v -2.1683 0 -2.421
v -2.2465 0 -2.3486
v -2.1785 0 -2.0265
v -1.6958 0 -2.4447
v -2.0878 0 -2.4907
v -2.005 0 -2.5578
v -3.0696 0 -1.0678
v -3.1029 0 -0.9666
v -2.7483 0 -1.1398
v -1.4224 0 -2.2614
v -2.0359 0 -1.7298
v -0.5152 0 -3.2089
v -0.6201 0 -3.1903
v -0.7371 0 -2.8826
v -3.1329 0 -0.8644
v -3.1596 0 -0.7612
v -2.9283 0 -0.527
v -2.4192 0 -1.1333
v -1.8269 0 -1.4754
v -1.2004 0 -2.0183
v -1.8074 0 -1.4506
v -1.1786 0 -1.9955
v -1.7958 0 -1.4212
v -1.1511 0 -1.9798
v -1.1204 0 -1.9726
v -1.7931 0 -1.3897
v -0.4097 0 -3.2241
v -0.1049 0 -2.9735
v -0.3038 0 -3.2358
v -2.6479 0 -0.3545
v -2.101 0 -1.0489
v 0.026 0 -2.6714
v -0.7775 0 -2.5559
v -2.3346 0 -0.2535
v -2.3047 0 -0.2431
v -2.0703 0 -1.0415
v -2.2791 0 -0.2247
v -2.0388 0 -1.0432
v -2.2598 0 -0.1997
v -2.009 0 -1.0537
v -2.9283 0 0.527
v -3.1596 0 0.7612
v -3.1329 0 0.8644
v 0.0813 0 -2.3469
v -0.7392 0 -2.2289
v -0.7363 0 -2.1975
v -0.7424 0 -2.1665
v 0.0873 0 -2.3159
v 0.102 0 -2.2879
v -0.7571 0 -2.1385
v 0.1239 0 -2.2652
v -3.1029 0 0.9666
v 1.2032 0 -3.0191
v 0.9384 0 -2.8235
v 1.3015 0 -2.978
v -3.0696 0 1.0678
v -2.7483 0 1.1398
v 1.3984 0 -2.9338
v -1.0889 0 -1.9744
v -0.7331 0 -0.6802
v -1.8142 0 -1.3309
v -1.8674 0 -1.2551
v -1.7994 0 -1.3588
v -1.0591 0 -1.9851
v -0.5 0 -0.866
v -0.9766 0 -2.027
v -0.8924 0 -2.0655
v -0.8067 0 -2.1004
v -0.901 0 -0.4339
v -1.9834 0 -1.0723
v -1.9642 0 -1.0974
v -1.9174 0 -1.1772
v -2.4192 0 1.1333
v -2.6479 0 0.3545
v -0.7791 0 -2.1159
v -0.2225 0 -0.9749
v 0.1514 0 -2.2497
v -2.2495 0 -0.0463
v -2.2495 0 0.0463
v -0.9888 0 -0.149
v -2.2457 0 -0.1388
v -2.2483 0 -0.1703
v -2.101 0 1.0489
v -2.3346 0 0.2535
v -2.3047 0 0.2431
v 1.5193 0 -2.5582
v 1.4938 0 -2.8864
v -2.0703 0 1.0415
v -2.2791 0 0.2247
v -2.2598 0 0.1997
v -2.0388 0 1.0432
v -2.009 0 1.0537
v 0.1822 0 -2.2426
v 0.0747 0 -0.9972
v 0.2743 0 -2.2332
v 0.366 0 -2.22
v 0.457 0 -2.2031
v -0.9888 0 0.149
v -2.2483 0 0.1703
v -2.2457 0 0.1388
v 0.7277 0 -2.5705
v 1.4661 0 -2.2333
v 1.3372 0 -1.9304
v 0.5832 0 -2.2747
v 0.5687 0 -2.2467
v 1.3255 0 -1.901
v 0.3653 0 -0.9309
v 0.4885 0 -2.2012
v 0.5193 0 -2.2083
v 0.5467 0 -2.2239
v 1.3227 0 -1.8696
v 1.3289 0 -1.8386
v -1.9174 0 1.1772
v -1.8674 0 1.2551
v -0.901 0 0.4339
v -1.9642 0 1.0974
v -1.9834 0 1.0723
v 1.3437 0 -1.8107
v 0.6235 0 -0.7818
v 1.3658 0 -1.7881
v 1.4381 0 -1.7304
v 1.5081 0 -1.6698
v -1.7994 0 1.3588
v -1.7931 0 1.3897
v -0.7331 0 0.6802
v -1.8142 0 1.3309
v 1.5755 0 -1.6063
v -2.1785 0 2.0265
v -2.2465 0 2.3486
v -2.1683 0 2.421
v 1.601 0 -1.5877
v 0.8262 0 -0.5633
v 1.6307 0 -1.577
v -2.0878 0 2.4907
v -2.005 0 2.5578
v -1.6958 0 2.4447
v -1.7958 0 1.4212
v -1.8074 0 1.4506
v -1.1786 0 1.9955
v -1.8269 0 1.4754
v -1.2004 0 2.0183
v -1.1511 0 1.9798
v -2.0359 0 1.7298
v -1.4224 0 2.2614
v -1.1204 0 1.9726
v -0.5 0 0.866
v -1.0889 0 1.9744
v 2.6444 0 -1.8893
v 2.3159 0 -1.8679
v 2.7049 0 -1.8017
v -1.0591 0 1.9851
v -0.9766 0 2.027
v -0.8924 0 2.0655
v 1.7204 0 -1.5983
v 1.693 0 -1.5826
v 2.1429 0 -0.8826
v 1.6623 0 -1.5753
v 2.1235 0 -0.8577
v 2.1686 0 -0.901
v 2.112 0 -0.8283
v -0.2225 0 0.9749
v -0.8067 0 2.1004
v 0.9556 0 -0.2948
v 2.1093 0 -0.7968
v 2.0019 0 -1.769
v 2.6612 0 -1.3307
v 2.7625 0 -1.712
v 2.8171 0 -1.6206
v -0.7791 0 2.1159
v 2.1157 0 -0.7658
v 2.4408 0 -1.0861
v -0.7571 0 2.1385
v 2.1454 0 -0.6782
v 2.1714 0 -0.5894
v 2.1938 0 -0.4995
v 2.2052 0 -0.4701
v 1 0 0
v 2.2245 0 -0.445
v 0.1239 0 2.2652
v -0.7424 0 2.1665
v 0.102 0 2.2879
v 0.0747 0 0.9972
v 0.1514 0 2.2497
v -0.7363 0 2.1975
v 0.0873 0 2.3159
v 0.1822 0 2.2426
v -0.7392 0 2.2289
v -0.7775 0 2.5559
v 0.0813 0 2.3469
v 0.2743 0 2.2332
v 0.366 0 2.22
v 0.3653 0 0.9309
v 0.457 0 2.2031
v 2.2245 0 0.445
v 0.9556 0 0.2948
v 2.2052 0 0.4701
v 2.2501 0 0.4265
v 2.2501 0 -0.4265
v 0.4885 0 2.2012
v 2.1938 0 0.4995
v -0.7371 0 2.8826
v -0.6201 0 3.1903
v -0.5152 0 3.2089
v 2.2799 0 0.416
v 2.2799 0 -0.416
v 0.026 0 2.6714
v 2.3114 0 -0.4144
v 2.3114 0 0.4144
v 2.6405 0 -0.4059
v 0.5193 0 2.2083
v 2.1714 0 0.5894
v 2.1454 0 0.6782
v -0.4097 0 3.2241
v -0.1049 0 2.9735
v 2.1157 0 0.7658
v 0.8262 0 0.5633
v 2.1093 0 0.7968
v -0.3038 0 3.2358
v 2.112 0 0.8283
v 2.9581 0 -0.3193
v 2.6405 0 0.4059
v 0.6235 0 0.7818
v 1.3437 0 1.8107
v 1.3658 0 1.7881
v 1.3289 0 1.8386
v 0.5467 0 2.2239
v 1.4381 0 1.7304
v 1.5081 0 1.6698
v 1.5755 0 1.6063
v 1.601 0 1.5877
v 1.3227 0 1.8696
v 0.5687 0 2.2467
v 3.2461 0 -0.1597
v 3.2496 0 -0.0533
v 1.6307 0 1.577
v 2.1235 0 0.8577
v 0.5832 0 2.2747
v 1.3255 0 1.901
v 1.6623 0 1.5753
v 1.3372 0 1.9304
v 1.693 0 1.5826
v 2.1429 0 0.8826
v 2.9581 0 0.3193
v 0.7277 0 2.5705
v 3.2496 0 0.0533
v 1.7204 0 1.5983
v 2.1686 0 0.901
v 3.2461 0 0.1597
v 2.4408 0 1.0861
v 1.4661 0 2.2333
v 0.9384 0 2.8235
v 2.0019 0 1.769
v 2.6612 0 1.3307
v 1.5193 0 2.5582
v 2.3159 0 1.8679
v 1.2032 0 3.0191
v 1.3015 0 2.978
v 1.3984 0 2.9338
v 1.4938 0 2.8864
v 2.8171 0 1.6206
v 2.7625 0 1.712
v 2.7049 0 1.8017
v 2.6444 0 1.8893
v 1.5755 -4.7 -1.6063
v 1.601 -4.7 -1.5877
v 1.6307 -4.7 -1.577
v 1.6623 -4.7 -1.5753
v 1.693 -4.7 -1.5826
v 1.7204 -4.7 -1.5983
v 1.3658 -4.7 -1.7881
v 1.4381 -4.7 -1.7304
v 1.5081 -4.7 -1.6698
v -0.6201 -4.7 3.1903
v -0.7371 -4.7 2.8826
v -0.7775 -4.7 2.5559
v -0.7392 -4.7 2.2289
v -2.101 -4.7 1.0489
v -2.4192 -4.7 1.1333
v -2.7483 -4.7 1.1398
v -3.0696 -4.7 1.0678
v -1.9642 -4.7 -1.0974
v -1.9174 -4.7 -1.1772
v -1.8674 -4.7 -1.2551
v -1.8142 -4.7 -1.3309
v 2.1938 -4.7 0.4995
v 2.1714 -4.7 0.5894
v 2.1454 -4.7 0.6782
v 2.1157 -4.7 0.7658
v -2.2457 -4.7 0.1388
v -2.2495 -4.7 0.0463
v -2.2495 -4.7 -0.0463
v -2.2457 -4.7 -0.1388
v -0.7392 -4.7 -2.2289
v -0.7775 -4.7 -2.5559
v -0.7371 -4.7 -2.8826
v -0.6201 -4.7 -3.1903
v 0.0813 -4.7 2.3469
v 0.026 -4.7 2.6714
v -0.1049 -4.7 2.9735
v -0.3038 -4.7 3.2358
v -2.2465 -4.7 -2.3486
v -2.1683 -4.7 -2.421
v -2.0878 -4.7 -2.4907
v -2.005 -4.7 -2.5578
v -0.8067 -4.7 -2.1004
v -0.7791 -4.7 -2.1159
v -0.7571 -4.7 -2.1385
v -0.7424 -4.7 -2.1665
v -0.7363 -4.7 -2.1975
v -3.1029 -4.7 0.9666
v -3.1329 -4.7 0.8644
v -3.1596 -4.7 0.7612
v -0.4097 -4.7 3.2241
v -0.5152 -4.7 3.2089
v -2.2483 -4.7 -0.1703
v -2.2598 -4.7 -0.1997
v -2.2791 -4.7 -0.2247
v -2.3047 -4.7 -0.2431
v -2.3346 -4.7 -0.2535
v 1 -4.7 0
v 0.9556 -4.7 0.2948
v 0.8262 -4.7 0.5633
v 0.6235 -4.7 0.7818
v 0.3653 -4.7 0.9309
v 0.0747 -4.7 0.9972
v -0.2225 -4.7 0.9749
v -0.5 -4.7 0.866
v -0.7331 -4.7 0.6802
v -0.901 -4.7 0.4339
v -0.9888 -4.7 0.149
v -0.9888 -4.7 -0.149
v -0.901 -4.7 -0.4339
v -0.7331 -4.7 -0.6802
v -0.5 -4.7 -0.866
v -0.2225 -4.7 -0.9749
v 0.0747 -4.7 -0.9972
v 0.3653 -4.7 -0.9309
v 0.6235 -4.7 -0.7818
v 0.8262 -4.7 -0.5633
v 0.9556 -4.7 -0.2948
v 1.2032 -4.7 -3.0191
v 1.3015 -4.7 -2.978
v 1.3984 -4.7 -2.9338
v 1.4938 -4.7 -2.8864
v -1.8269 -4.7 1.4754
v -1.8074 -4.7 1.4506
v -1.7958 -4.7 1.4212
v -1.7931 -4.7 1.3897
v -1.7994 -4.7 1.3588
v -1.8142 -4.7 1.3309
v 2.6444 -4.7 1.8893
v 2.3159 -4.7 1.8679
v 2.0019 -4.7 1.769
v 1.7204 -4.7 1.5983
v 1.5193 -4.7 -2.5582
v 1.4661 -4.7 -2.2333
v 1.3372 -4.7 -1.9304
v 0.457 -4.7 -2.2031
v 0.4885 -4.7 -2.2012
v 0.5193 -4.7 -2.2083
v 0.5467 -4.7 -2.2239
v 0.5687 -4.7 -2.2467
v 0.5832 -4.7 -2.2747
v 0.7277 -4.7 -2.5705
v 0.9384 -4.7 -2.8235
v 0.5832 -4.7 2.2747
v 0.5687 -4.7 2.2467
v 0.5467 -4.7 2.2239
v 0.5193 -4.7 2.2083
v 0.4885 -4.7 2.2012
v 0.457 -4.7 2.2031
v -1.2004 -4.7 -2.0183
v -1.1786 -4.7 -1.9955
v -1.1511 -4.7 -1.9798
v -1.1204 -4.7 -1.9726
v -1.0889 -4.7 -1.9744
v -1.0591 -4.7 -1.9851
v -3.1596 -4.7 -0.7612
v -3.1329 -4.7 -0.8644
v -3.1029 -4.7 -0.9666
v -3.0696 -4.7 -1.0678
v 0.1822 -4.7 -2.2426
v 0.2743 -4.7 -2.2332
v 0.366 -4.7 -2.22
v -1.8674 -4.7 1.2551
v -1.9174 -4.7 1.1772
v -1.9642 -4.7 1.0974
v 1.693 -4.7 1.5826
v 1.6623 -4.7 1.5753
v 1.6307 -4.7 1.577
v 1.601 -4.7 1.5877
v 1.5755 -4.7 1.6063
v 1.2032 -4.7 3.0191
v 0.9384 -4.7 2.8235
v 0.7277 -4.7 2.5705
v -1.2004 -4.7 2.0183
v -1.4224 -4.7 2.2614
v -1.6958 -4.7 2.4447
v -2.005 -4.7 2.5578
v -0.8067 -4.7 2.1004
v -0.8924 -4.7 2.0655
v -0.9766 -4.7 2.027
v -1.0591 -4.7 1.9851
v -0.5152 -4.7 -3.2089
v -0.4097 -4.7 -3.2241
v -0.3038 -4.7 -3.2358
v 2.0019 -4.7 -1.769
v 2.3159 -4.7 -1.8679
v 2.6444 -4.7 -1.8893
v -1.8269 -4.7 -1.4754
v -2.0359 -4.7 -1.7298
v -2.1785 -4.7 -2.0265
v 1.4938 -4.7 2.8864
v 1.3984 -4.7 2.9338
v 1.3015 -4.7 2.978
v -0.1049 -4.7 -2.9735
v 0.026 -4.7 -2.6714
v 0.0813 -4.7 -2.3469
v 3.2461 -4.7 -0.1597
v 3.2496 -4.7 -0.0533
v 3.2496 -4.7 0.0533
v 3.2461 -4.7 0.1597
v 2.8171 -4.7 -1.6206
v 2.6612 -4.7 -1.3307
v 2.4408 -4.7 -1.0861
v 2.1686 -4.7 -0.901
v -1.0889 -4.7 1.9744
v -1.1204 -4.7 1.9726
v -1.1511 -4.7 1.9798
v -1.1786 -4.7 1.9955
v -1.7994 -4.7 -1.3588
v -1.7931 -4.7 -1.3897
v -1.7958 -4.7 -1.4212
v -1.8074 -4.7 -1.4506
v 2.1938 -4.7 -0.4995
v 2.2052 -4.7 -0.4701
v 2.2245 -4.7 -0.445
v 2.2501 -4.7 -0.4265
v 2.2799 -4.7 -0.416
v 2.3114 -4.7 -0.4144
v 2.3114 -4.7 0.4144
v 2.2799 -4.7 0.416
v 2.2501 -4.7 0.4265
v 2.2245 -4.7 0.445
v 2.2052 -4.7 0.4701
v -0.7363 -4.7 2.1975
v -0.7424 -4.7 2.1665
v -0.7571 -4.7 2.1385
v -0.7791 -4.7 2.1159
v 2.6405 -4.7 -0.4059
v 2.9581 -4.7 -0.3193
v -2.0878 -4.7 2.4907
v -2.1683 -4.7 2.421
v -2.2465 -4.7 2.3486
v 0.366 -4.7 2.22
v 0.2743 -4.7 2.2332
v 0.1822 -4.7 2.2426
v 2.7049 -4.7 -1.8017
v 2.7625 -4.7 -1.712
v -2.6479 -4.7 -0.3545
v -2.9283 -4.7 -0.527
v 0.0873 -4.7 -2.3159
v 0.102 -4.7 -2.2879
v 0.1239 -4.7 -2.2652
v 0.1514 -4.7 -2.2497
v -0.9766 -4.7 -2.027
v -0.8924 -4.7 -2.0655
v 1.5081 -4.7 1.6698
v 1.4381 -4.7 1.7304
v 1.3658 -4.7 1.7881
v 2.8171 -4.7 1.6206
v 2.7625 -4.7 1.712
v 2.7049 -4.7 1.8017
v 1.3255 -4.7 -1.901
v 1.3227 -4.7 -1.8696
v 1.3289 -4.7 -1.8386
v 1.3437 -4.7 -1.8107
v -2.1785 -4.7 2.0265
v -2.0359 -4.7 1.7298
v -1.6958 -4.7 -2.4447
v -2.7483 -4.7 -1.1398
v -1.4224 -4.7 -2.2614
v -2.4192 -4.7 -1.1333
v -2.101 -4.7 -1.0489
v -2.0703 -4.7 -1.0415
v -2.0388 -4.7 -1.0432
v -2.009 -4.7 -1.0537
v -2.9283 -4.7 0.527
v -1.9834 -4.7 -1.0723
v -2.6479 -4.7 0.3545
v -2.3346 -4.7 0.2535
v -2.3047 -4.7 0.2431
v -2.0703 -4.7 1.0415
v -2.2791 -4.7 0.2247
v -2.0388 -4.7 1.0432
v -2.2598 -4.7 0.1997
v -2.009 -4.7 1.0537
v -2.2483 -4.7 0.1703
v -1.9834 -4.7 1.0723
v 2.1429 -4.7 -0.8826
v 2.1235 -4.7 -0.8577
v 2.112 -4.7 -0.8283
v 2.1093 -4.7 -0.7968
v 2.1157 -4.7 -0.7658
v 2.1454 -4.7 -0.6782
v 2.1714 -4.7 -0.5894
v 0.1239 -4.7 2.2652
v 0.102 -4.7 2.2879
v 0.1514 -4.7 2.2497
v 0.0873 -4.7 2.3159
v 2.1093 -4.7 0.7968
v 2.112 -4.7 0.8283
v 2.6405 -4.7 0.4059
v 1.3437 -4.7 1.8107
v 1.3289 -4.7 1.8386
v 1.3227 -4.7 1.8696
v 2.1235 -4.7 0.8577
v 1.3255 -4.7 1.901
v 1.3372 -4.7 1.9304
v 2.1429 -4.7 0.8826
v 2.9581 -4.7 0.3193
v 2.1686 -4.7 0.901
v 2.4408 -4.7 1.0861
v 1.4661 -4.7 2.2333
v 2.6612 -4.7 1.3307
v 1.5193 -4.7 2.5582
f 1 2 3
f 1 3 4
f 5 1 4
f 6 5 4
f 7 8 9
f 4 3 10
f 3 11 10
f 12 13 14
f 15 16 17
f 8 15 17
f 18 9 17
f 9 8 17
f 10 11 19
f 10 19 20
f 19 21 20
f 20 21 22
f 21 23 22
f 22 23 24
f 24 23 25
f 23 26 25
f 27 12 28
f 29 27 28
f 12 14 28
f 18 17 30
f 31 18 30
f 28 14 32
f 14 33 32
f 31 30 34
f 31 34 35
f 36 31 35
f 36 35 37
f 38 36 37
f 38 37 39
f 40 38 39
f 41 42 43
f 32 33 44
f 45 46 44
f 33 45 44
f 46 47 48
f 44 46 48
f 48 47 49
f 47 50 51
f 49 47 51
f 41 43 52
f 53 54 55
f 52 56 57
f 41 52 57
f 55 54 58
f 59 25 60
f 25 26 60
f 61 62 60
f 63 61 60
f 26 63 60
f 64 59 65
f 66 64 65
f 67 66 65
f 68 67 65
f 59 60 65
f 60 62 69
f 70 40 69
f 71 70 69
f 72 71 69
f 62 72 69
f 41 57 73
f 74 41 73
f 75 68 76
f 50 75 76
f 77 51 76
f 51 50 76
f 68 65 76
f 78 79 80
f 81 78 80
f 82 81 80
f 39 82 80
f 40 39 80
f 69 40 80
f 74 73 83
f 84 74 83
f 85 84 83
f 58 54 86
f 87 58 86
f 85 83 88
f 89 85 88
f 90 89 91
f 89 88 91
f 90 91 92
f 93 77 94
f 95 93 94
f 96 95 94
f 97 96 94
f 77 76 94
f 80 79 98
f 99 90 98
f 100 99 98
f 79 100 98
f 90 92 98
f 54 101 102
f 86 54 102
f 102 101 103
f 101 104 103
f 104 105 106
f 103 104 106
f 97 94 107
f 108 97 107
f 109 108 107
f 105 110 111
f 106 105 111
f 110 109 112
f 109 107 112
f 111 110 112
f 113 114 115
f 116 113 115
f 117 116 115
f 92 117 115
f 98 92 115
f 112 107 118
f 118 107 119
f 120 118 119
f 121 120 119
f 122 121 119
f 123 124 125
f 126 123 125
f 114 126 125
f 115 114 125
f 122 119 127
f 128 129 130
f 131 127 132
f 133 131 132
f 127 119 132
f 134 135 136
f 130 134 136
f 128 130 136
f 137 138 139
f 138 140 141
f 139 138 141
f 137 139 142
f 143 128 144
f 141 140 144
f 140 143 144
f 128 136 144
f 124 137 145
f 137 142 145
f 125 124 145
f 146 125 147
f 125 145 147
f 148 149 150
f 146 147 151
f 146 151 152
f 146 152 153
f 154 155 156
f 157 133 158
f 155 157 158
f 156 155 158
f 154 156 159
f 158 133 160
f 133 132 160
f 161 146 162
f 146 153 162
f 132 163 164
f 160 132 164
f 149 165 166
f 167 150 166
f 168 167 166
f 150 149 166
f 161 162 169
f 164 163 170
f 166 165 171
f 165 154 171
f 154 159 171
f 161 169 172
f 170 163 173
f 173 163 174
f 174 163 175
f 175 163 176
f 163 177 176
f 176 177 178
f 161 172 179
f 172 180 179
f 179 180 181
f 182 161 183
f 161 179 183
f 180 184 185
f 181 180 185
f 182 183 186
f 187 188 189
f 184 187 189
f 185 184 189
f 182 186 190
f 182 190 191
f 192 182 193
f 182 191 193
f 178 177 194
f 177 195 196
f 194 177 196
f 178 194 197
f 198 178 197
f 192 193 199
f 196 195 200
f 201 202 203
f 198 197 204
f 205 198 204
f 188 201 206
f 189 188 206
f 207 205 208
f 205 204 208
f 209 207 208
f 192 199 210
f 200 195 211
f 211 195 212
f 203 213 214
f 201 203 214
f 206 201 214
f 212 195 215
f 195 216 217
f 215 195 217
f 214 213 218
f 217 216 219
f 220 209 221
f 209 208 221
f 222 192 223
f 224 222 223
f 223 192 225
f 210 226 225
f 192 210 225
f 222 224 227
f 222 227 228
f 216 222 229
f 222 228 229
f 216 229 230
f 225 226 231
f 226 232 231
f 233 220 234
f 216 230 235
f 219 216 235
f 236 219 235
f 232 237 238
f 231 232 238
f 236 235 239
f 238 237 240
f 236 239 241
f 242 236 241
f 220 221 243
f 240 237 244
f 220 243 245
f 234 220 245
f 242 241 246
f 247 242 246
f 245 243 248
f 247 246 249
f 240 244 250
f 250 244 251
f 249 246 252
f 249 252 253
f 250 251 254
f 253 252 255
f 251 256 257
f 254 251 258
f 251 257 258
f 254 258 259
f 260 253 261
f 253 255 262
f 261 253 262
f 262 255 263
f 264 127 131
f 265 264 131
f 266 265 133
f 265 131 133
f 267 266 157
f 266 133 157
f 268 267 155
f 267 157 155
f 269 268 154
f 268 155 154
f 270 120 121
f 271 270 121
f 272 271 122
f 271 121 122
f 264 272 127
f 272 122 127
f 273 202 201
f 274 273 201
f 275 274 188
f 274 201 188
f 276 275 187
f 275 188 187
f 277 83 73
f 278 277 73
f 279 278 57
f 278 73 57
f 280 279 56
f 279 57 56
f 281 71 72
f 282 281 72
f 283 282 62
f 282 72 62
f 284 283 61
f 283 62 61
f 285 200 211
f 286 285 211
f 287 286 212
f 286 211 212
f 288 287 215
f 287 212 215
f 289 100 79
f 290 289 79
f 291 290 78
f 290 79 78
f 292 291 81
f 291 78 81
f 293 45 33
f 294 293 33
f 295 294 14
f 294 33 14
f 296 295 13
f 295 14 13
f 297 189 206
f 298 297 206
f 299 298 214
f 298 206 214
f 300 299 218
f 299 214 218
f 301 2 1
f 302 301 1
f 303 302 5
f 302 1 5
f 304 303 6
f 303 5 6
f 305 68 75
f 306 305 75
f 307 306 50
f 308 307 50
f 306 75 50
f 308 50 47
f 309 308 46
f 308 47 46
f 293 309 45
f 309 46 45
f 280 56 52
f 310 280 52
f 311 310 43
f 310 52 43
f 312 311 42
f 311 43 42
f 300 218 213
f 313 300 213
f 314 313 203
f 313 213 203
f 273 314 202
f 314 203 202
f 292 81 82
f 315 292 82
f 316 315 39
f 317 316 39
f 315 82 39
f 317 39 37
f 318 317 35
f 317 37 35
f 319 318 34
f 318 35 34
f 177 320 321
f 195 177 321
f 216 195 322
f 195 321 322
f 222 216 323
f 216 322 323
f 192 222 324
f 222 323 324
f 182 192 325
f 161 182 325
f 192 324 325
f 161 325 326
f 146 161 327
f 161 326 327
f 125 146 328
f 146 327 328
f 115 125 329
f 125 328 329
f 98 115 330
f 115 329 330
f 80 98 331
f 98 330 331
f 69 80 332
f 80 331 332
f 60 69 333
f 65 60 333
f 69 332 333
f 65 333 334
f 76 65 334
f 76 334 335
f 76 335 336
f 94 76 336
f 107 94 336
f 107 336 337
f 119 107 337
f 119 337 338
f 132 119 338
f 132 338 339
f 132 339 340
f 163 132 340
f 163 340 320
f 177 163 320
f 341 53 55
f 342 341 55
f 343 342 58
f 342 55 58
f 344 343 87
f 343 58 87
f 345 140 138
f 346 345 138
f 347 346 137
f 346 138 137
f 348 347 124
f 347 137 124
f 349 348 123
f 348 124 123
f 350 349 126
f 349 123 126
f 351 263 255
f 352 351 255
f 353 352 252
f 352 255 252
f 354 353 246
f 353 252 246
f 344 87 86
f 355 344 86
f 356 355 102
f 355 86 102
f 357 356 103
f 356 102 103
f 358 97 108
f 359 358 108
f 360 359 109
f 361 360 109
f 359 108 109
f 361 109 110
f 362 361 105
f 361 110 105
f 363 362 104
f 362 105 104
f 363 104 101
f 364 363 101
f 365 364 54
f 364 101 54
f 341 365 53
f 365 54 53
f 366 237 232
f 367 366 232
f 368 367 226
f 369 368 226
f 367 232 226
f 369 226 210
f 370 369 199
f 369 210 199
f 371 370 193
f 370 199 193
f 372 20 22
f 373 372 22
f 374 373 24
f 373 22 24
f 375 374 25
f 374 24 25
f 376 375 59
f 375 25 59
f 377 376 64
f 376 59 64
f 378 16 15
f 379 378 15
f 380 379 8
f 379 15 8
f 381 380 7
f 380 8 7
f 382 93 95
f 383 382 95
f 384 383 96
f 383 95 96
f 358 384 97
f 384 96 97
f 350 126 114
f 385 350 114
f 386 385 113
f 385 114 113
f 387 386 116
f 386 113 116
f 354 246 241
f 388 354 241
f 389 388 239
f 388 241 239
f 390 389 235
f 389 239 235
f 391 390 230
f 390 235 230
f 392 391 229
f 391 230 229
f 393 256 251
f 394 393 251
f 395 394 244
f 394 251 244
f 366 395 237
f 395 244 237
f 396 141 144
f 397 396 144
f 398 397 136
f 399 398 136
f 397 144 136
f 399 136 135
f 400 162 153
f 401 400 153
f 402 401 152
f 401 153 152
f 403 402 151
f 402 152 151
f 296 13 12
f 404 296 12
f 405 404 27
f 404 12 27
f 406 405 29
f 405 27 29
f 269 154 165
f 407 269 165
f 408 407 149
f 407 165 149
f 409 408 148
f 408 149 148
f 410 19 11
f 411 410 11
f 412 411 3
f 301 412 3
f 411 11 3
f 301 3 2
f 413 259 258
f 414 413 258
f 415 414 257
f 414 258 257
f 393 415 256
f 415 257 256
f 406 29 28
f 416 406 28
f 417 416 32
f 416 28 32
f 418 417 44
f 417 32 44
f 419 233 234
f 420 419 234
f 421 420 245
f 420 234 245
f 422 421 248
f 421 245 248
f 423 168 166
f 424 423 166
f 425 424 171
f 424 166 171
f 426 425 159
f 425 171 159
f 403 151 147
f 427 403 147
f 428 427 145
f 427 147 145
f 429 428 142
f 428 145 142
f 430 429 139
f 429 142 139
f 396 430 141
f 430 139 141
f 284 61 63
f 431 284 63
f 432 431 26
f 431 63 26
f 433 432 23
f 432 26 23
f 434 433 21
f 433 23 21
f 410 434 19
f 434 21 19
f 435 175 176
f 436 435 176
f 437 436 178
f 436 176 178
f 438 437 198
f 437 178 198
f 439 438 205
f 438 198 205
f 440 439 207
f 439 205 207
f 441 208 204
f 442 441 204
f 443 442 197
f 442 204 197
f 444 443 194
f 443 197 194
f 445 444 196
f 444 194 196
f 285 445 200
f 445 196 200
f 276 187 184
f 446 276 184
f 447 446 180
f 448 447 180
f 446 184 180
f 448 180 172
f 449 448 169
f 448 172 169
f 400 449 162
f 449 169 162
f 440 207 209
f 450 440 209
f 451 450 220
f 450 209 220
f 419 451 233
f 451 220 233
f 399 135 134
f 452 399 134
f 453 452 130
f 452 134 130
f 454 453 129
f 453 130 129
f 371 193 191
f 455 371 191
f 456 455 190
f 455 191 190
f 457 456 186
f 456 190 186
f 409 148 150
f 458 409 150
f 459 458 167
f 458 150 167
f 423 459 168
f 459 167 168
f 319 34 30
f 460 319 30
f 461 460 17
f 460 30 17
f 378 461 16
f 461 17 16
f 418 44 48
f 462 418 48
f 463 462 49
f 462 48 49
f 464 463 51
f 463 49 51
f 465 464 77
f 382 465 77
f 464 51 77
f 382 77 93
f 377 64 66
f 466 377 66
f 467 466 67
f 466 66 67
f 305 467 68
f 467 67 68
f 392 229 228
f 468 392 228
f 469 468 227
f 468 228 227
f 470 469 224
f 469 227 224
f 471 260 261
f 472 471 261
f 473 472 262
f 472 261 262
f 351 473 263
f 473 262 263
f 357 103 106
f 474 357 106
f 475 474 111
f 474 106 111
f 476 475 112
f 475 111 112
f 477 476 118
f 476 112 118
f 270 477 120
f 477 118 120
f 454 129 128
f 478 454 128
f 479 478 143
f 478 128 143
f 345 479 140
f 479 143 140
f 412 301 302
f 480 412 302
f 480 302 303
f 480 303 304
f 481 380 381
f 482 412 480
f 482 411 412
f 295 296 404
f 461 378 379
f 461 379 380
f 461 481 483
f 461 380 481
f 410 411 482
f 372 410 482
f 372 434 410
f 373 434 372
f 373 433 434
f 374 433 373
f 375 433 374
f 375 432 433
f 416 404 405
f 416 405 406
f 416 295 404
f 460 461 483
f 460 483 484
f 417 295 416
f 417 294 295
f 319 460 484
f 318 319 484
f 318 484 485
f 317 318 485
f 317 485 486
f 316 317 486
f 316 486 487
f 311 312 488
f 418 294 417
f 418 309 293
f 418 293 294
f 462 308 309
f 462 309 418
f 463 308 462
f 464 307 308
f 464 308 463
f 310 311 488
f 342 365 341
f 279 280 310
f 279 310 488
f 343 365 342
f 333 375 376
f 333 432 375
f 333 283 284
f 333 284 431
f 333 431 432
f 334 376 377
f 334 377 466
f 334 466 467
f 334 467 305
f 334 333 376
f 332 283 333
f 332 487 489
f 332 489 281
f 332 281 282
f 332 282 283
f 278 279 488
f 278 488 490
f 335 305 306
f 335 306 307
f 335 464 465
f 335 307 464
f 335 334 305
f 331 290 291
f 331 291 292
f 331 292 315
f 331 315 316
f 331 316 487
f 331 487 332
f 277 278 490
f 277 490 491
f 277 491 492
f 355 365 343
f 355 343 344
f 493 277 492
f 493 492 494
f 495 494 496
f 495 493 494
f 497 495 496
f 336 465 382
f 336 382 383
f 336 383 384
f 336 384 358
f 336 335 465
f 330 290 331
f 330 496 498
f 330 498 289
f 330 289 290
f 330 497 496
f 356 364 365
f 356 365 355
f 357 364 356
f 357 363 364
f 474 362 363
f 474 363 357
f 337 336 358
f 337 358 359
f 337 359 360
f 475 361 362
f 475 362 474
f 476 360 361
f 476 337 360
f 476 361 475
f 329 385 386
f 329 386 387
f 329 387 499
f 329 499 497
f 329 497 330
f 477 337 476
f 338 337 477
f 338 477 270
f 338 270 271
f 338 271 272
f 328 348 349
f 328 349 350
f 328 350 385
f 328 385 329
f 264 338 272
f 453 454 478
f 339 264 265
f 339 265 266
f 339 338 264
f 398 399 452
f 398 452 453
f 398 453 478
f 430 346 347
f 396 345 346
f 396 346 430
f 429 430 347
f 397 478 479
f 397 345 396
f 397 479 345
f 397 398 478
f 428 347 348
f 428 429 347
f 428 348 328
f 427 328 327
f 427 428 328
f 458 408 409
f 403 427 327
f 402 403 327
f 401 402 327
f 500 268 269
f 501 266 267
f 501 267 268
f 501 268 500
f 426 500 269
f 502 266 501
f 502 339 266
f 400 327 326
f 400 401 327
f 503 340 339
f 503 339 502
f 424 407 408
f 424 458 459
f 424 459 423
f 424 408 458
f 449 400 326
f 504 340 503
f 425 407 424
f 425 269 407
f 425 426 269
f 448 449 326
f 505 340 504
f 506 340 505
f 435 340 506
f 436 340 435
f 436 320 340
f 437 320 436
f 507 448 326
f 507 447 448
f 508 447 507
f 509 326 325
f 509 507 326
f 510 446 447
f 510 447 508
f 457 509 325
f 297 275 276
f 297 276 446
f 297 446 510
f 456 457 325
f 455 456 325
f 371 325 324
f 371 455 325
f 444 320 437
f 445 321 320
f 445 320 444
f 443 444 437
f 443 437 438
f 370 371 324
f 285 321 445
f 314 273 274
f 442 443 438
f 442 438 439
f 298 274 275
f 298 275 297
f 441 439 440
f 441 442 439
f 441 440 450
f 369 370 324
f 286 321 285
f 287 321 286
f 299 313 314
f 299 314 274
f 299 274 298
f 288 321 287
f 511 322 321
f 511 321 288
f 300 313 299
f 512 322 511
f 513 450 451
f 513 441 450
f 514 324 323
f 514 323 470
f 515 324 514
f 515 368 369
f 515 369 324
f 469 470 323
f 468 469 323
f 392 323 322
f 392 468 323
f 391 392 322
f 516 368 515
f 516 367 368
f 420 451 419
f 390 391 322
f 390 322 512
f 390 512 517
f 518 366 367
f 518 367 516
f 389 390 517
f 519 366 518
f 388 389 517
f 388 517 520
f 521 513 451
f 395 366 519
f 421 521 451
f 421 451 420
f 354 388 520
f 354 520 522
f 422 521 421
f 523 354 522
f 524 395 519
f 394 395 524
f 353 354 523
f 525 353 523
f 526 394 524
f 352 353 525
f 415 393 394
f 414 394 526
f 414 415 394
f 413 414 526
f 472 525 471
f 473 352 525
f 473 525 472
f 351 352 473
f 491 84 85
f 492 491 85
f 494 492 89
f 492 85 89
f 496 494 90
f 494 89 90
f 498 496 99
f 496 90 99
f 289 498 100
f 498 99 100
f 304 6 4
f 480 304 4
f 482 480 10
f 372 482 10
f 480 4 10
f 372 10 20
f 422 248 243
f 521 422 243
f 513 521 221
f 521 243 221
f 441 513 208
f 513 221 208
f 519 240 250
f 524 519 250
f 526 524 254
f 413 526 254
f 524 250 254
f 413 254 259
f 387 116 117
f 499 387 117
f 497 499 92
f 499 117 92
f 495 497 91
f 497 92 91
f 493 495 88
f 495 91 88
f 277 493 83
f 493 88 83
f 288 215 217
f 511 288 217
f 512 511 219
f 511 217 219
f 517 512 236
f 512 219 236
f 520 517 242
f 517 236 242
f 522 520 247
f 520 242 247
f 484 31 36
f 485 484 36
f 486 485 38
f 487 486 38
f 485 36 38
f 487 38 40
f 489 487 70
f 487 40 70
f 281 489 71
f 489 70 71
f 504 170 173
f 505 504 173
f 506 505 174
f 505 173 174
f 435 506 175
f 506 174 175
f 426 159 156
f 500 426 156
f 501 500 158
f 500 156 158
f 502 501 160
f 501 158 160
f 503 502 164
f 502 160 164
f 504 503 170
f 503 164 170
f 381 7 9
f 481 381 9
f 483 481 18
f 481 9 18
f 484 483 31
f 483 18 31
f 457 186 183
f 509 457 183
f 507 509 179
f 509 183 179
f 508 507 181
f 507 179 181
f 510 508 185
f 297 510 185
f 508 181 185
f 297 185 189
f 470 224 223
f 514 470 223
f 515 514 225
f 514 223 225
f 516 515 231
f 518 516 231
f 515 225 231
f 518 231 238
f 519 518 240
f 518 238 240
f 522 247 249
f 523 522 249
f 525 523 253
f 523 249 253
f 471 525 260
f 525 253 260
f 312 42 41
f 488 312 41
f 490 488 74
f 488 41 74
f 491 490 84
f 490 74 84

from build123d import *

# Parameters (mm, degrees)
F1_DEPTH = 4.7
F2_R     = 1
F3_DEPTH = 4.701


with BuildPart() as f1:
    # F0 (on Front) → F1 (new body)
    with BuildSketch(Plane.XZ):
        with BuildLine():
            ThreePointArc((0.081282, 2.346874), (-0.030407, 2.82636), (-0.303843, 3.235766))
            ThreePointArc((-0.303843, 3.235766), (-0.462523, 3.21692), (-0.620085, 3.190297))
            ThreePointArc((-0.620085, 3.190297), (-0.767102, 2.720439), (-0.73918, 2.228909))
            ThreePointArc((-0.73918, 2.228909), (-0.74873, 2.151955), (-0.806675, 2.100423))
            ThreePointArc((-0.806675, 2.100423), (-0.934684, 2.046672), (-1.059134, 1.985128))
            ThreePointArc((-1.059134, 1.985128), (-1.10292, 1.96114), (-1.146162, 1.936185))
            ThreePointArc((-1.146162, 1.936185), (-1.473437, 1.700437), (-1.753362, 1.410044))
            ThreePointArc((-1.753362, 1.410044), (-1.784216, 1.370793), (-1.814192, 1.330867))
            ThreePointArc((-1.814192, 1.330867), (-1.89282, 1.216442), (-1.964242, 1.097385))
            ThreePointArc((-1.964242, 1.097385), (-1.988107, 1.053532), (-2.010994, 1.00916))
            ThreePointArc((-2.010994, 1.00916), (-2.158859, 0.633898), (-2.237349, 0.238265))
            ThreePointArc((-2.237349, 0.238265), (-2.242085, 0.188564), (-2.245717, 0.13877))
            ThreePointArc((-2.245717, 0.13877), (-2.25, 0), (-2.245717, -0.13877))
            ThreePointArc((-2.245717, -0.13877), (-2.242085, -0.188564), (-2.237349, -0.238265))
            ThreePointArc((-2.237349, -0.238265), (-2.158859, -0.633898), (-2.010994, -1.00916))
            ThreePointArc((-2.010994, -1.00916), (-1.988107, -1.053532), (-1.964242, -1.097385))
            ThreePointArc((-1.964242, -1.097385), (-1.89282, -1.216442), (-1.814192, -1.330867))
            ThreePointArc((-1.814192, -1.330867), (-1.784216, -1.370793), (-1.753362, -1.410044))
            ThreePointArc((-1.753362, -1.410044), (-1.473437, -1.700437), (-1.146162, -1.936185))
            ThreePointArc((-1.146162, -1.936185), (-1.10292, -1.96114), (-1.059134, -1.985128))
            ThreePointArc((-1.059134, -1.985128), (-0.934684, -2.046672), (-0.806675, -2.100423))
            ThreePointArc((-0.806675, -2.100423), (-0.759872, -2.117804), (-0.712694, -2.134143))
            ThreePointArc((-0.712694, -2.134143), (-0.320208, -2.227098), (0.082568, -2.248485))
            ThreePointArc((0.082568, -2.248485), (0.132437, -2.246099), (0.182241, -2.242607))
            ThreePointArc((0.182241, -2.242607), (0.320208, -2.227098), (0.456956, -2.203109))
            ThreePointArc((0.456956, -2.203109), (0.505727, -2.192428), (0.554248, -2.180667))
            ThreePointArc((0.554248, -2.180667), (0.934684, -2.046672), (1.285083, -1.846906))
            ThreePointArc((1.285083, -1.846906), (1.325746, -1.817938), (1.365756, -1.788074))
            ThreePointArc((1.365756, -1.788074), (1.473437, -1.700437), (1.575507, -1.606324))
            ThreePointArc((1.575507, -1.606324), (1.610761, -1.570971), (1.645221, -1.534845))
            ThreePointArc((1.645221, -1.534845), (1.89282, -1.216442), (2.079593, -0.858948))
            ThreePointArc((2.079593, -0.858948), (2.09814, -0.812594), (2.115653, -0.76584))
            ThreePointArc((2.115653, -0.76584), (2.158859, -0.633898), (2.193845, -0.499542))
            ThreePointArc((2.193845, -0.499542), (2.204389, -0.450742), (2.213848, -0.40172))
            ThreePointArc((2.213848, -0.40172), (2.25, 0), (2.213848, 0.40172))
            ThreePointArc((2.213848, 0.40172), (2.204389, 0.450742), (2.193845, 0.499542))
            ThreePointArc((2.193845, 0.499542), (2.158859, 0.633898), (2.115653, 0.76584))
            ThreePointArc((2.115653, 0.76584), (2.09814, 0.812594), (2.079593, 0.858948))
            ThreePointArc((2.079593, 0.858948), (1.89282, 1.216442), (1.645221, 1.534845))
            ThreePointArc((1.645221, 1.534845), (1.610761, 1.570971), (1.575507, 1.606324))
            ThreePointArc((1.575507, 1.606324), (1.473437, 1.700437), (1.365756, 1.788074))
            ThreePointArc((1.365756, 1.788074), (1.325746, 1.817938), (1.285083, 1.846906))
            ThreePointArc((1.285083, 1.846906), (0.934684, 2.046672), (0.554248, 2.180667))
            ThreePointArc((0.554248, 2.180667), (0.505727, 2.192428), (0.456956, 2.203109))
            ThreePointArc((0.456956, 2.203109), (0.320208, 2.227098), (0.182241, 2.242607))
            ThreePointArc((0.182241, 2.242607), (0.112126, 2.275728), (0.081282, 2.346874))
        make_face()
        with BuildLine():
            ThreePointArc((0.583201, 2.274709), (0.533563, 2.215134), (0.456956, 2.203109))
            ThreePointArc((0.456956, 2.203109), (0.505727, 2.192428), (0.554248, 2.180667))
            ThreePointArc((0.554248, 2.180667), (0.567883, 2.227947), (0.583201, 2.274709))
        make_face()
        with BuildLine():
            ThreePointArc((0.583201, 2.274709), (0.567883, 2.227947), (0.554248, 2.180667))
            ThreePointArc((0.554248, 2.180667), (0.934684, 2.046672), (1.285083, 1.846906))
            ThreePointArc((1.285083, 1.846906), (1.311886, 1.888173), (1.337195, 1.930372))
            ThreePointArc((1.337195, 1.930372), (1.502466, 2.394124), (1.493778, 2.886369))
            ThreePointArc((1.493778, 2.886369), (1.350099, 2.956304), (1.203156, 3.019092))
            ThreePointArc((1.203156, 3.019092), (0.825453, 2.703306), (0.583201, 2.274709))
        make_face()
        with BuildLine():
            ThreePointArc((-1.146162, 1.936185), (-1.10292, 1.96114), (-1.059134, 1.985128))
            ThreePointArc((-1.059134, 1.985128), (-1.136025, 1.975084), (-1.200437, 2.01826))
            ThreePointArc((-1.200437, 2.01826), (-1.172565, 1.977708), (-1.146162, 1.936185))
        make_face()
        with BuildLine():
            ThreePointArc((1.337195, 1.930372), (1.311886, 1.888173), (1.285083, 1.846906))
            ThreePointArc((1.285083, 1.846906), (1.325746, 1.817938), (1.365756, 1.788074))
            ThreePointArc((1.365756, 1.788074), (1.324677, 1.853844), (1.337195, 1.930372))
        make_face()
        with BuildLine():
            ThreePointArc((-1.753362, 1.410044), (-1.473437, 1.700437), (-1.146162, 1.936185))
            ThreePointArc((-1.146162, 1.936185), (-1.172565, 1.977708), (-1.200437, 2.01826))
            ThreePointArc((-1.200437, 2.01826), (-1.553625, 2.361246), (-2.004996, 2.557829))
            ThreePointArc((-2.004996, 2.557829), (-2.128297, 2.456186), (-2.246453, 2.348605))
            ThreePointArc((-2.246453, 2.348605), (-2.116108, 1.873852), (-1.826877, 1.475447))
            ThreePointArc((-1.826877, 1.475447), (-1.790705, 1.442087), (-1.753362, 1.410044))
        make_face()
        with BuildLine():
            ThreePointArc((-1.814192, 1.330867), (-1.784216, 1.370793), (-1.753362, 1.410044))
            ThreePointArc((-1.753362, 1.410044), (-1.790705, 1.442087), (-1.826877, 1.475447))
            ThreePointArc((-1.826877, 1.475447), (-1.793307, 1.405546), (-1.814192, 1.330867))
        make_face()
        with BuildLine():
            ThreePointArc((1.720421, 1.598304), (1.646454, 1.575024), (1.575507, 1.606324))
            ThreePointArc((1.575507, 1.606324), (1.610761, 1.570971), (1.645221, 1.534845))
            ThreePointArc((1.645221, 1.534845), (1.682253, 1.567247), (1.720421, 1.598304))
        make_face()
        with BuildLine():
            ThreePointArc((1.720421, 1.598304), (1.682253, 1.567247), (1.645221, 1.534845))
            ThreePointArc((1.645221, 1.534845), (1.89282, 1.216442), (2.079593, 0.858948))
            ThreePointArc((2.079593, 0.858948), (2.124452, 0.879173), (2.168557, 0.90099))
            ThreePointArc((2.168557, 0.90099), (2.558316, 1.201771), (2.817135, 1.620571))
            ThreePointArc((2.817135, 1.620571), (2.734074, 1.757083), (2.644404, 1.889346))
            ThreePointArc((2.644404, 1.889346), (2.155932, 1.827892), (1.720421, 1.598304))
        make_face()
        with BuildLine():
            ThreePointArc((-2.010994, 1.00916), (-1.988107, 1.053532), (-1.964242, 1.097385))
            ThreePointArc((-1.964242, 1.097385), (-2.023496, 1.047365), (-2.101026, 1.048863))
            ThreePointArc((-2.101026, 1.048863), (-2.055654, 1.029818), (-2.010994, 1.00916))
        make_face()
        with BuildLine():
            ThreePointArc((2.168557, 0.90099), (2.124452, 0.879173), (2.079593, 0.858948))
            ThreePointArc((2.079593, 0.858948), (2.09814, 0.812594), (2.115653, 0.76584))
            ThreePointArc((2.115653, 0.76584), (2.116653, 0.843378), (2.168557, 0.90099))
        make_face()
        with BuildLine():
            ThreePointArc((-2.237349, 0.238265), (-2.158859, 0.633898), (-2.010994, 1.00916))
            ThreePointArc((-2.010994, 1.00916), (-2.055654, 1.029818), (-2.101026, 1.048863))
            ThreePointArc((-2.101026, 1.048863), (-2.583579, 1.146453), (-3.069577, 1.0678))
            ThreePointArc((-3.069577, 1.0678), (-3.118352, 0.915631), (-3.159589, 0.761248))
            ThreePointArc((-3.159589, 0.761248), (-2.793264, 0.43233), (-2.334554, 0.25354))
            ThreePointArc((-2.334554, 0.25354), (-2.286088, 0.245033), (-2.237349, 0.238265))
        make_face()
        with BuildLine():
            ThreePointArc((-2.245717, 0.13877), (-2.242085, 0.188564), (-2.237349, 0.238265))
            ThreePointArc((-2.237349, 0.238265), (-2.286088, 0.245033), (-2.334554, 0.25354))
            ThreePointArc((-2.334554, 0.25354), (-2.268521, 0.212885), (-2.245717, 0.13877))
        make_face()
        with BuildLine():
            ThreePointArc((2.311418, 0.41445), (2.236607, 0.434854), (2.193845, 0.499542))
            ThreePointArc((2.193845, 0.499542), (2.204389, 0.450742), (2.213848, 0.40172))
            ThreePointArc((2.213848, 0.40172), (2.262519, 0.408958), (2.311418, 0.41445))
        make_face()
        with BuildLine():
            ThreePointArc((2.311418, 0.41445), (2.262519, 0.408958), (2.213848, 0.40172))
            ThreePointArc((2.213848, 0.40172), (2.25, 0), (2.213848, -0.40172))
            ThreePointArc((2.213848, -0.40172), (2.262519, -0.408958), (2.311418, -0.41445))
            ThreePointArc((2.311418, -0.41445), (2.801919, -0.372136), (3.246072, -0.159747))
            ThreePointArc((3.246072, -0.159747), (3.25, 0), (3.246072, 0.159747))
            ThreePointArc((3.246072, 0.159747), (2.801919, 0.372136), (2.311418, 0.41445))
        make_face()
        with BuildLine():
            ThreePointArc((-2.237349, -0.238265), (-2.242085, -0.188564), (-2.245717, -0.13877))
            ThreePointArc((-2.245717, -0.13877), (-2.268521, -0.212885), (-2.334554, -0.25354))
            ThreePointArc((-2.334554, -0.25354), (-2.286088, -0.245033), (-2.237349, -0.238265))
        make_face()
        with BuildLine():
            ThreePointArc((2.311418, -0.41445), (2.262519, -0.408958), (2.213848, -0.40172))
            ThreePointArc((2.213848, -0.40172), (2.204389, -0.450742), (2.193845, -0.499542))
            ThreePointArc((2.193845, -0.499542), (2.236607, -0.434854), (2.311418, -0.41445))
        make_face()
        with BuildLine():
            ThreePointArc((-2.010994, -1.00916), (-2.158859, -0.633898), (-2.237349, -0.238265))
            ThreePointArc((-2.237349, -0.238265), (-2.286088, -0.245033), (-2.334554, -0.25354))
            ThreePointArc((-2.334554, -0.25354), (-2.793264, -0.43233), (-3.159589, -0.761248))
            ThreePointArc((-3.159589, -0.761248), (-3.118352, -0.915631), (-3.069577, -1.0678))
            ThreePointArc((-3.069577, -1.0678), (-2.583579, -1.146453), (-2.101026, -1.048863))
            ThreePointArc((-2.101026, -1.048863), (-2.055654, -1.029818), (-2.010994, -1.00916))
        make_face()
        with BuildLine():
            ThreePointArc((-1.964242, -1.097385), (-1.988107, -1.053532), (-2.010994, -1.00916))
            ThreePointArc((-2.010994, -1.00916), (-2.055654, -1.029818), (-2.101026, -1.048863))
            ThreePointArc((-2.101026, -1.048863), (-2.023496, -1.047365), (-1.964242, -1.097385))
        make_face()
        with BuildLine():
            ThreePointArc((2.168557, -0.90099), (2.116653, -0.843378), (2.115653, -0.76584))
            ThreePointArc((2.115653, -0.76584), (2.09814, -0.812594), (2.079593, -0.858948))
            ThreePointArc((2.079593, -0.858948), (2.124452, -0.879173), (2.168557, -0.90099))
        make_face()
        with BuildLine():
            ThreePointArc((2.168557, -0.90099), (2.124452, -0.879173), (2.079593, -0.858948))
            ThreePointArc((2.079593, -0.858948), (1.89282, -1.216442), (1.645221, -1.534845))
            ThreePointArc((1.645221, -1.534845), (1.682253, -1.567247), (1.720421, -1.598304))
            ThreePointArc((1.720421, -1.598304), (2.155932, -1.827892), (2.644404, -1.889346))
            ThreePointArc((2.644404, -1.889346), (2.734074, -1.757083), (2.817135, -1.620571))
            ThreePointArc((2.817135, -1.620571), (2.558316, -1.201771), (2.168557, -0.90099))
        make_face()
        with BuildLine():
            ThreePointArc((-1.753362, -1.410044), (-1.784216, -1.370793), (-1.814192, -1.330867))
            ThreePointArc((-1.814192, -1.330867), (-1.793307, -1.405546), (-1.826877, -1.475447))
            ThreePointArc((-1.826877, -1.475447), (-1.790705, -1.442087), (-1.753362, -1.410044))
        make_face()
        with BuildLine():
            ThreePointArc((1.720421, -1.598304), (1.682253, -1.567247), (1.645221, -1.534845))
            ThreePointArc((1.645221, -1.534845), (1.610761, -1.570971), (1.575507, -1.606324))
            ThreePointArc((1.575507, -1.606324), (1.646454, -1.575024), (1.720421, -1.598304))
        make_face()
        with BuildLine():
            ThreePointArc((-1.146162, -1.936185), (-1.473437, -1.700437), (-1.753362, -1.410044))
            ThreePointArc((-1.753362, -1.410044), (-1.790705, -1.442087), (-1.826877, -1.475447))
            ThreePointArc((-1.826877, -1.475447), (-2.116108, -1.873852), (-2.246453, -2.348605))
            ThreePointArc((-2.246453, -2.348605), (-2.128297, -2.456186), (-2.004996, -2.557829))
            ThreePointArc((-2.004996, -2.557829), (-1.553625, -2.361246), (-1.200437, -2.01826))
            ThreePointArc((-1.200437, -2.01826), (-1.172565, -1.977708), (-1.146162, -1.936185))
        make_face()
        with BuildLine():
            ThreePointArc((-1.059134, -1.985128), (-1.10292, -1.96114), (-1.146162, -1.936185))
            ThreePointArc((-1.146162, -1.936185), (-1.172565, -1.977708), (-1.200437, -2.01826))
            ThreePointArc((-1.200437, -2.01826), (-1.136025, -1.975084), (-1.059134, -1.985128))
        make_face()
        with BuildLine():
            ThreePointArc((1.337195, -1.930372), (1.324677, -1.853844), (1.365756, -1.788074))
            ThreePointArc((1.365756, -1.788074), (1.325746, -1.817938), (1.285083, -1.846906))
            ThreePointArc((1.285083, -1.846906), (1.311886, -1.888173), (1.337195, -1.930372))
        make_face()
        with BuildLine():
            ThreePointArc((1.337195, -1.930372), (1.311886, -1.888173), (1.285083, -1.846906))
            ThreePointArc((1.285083, -1.846906), (0.934684, -2.046672), (0.554248, -2.180667))
            ThreePointArc((0.554248, -2.180667), (0.567883, -2.227947), (0.583201, -2.274709))
            ThreePointArc((0.583201, -2.274709), (0.825453, -2.703306), (1.203156, -3.019092))
            ThreePointArc((1.203156, -3.019092), (1.350099, -2.956304), (1.493778, -2.886369))
            ThreePointArc((1.493778, -2.886369), (1.502466, -2.394124), (1.337195, -1.930372))
        make_face()
        with BuildLine():
            ThreePointArc((-0.712694, -2.134143), (-0.759872, -2.117804), (-0.806675, -2.100423))
            ThreePointArc((-0.806675, -2.100423), (-0.74873, -2.151955), (-0.73918, -2.228909))
            ThreePointArc((-0.73918, -2.228909), (-0.726785, -2.181289), (-0.712694, -2.134143))
        make_face()
        with BuildLine():
            ThreePointArc((0.583201, -2.274709), (0.567883, -2.227947), (0.554248, -2.180667))
            ThreePointArc((0.554248, -2.180667), (0.505727, -2.192428), (0.456956, -2.203109))
            ThreePointArc((0.456956, -2.203109), (0.533563, -2.215134), (0.583201, -2.274709))
        make_face()
        with BuildLine():
            ThreePointArc((0.082568, -2.248485), (-0.320208, -2.227098), (-0.712694, -2.134143))
            ThreePointArc((-0.712694, -2.134143), (-0.726785, -2.181289), (-0.73918, -2.228909))
            ThreePointArc((-0.73918, -2.228909), (-0.767102, -2.720439), (-0.620085, -3.190297))
            ThreePointArc((-0.620085, -3.190297), (-0.462523, -3.21692), (-0.303843, -3.235766))
            ThreePointArc((-0.303843, -3.235766), (-0.030407, -2.82636), (0.081282, -2.346874))
            ThreePointArc((0.081282, -2.346874), (0.082805, -2.297691), (0.082568, -2.248485))
        make_face()
        with BuildLine():
            ThreePointArc((0.182241, -2.242607), (0.132437, -2.246099), (0.082568, -2.248485))
            ThreePointArc((0.082568, -2.248485), (0.082805, -2.297691), (0.081282, -2.346874))
            ThreePointArc((0.081282, -2.346874), (0.112126, -2.275728), (0.182241, -2.242607))
        make_face()
    extrude(amount=F1_DEPTH)

    # F2 (on face) → F3 (cut, through all)
    with BuildSketch(Plane.XZ.offset(4.7)):
        Circle(F2_R)
    extrude(amount=-F3_DEPTH, mode=Mode.SUBTRACT)


solid = f1.part
